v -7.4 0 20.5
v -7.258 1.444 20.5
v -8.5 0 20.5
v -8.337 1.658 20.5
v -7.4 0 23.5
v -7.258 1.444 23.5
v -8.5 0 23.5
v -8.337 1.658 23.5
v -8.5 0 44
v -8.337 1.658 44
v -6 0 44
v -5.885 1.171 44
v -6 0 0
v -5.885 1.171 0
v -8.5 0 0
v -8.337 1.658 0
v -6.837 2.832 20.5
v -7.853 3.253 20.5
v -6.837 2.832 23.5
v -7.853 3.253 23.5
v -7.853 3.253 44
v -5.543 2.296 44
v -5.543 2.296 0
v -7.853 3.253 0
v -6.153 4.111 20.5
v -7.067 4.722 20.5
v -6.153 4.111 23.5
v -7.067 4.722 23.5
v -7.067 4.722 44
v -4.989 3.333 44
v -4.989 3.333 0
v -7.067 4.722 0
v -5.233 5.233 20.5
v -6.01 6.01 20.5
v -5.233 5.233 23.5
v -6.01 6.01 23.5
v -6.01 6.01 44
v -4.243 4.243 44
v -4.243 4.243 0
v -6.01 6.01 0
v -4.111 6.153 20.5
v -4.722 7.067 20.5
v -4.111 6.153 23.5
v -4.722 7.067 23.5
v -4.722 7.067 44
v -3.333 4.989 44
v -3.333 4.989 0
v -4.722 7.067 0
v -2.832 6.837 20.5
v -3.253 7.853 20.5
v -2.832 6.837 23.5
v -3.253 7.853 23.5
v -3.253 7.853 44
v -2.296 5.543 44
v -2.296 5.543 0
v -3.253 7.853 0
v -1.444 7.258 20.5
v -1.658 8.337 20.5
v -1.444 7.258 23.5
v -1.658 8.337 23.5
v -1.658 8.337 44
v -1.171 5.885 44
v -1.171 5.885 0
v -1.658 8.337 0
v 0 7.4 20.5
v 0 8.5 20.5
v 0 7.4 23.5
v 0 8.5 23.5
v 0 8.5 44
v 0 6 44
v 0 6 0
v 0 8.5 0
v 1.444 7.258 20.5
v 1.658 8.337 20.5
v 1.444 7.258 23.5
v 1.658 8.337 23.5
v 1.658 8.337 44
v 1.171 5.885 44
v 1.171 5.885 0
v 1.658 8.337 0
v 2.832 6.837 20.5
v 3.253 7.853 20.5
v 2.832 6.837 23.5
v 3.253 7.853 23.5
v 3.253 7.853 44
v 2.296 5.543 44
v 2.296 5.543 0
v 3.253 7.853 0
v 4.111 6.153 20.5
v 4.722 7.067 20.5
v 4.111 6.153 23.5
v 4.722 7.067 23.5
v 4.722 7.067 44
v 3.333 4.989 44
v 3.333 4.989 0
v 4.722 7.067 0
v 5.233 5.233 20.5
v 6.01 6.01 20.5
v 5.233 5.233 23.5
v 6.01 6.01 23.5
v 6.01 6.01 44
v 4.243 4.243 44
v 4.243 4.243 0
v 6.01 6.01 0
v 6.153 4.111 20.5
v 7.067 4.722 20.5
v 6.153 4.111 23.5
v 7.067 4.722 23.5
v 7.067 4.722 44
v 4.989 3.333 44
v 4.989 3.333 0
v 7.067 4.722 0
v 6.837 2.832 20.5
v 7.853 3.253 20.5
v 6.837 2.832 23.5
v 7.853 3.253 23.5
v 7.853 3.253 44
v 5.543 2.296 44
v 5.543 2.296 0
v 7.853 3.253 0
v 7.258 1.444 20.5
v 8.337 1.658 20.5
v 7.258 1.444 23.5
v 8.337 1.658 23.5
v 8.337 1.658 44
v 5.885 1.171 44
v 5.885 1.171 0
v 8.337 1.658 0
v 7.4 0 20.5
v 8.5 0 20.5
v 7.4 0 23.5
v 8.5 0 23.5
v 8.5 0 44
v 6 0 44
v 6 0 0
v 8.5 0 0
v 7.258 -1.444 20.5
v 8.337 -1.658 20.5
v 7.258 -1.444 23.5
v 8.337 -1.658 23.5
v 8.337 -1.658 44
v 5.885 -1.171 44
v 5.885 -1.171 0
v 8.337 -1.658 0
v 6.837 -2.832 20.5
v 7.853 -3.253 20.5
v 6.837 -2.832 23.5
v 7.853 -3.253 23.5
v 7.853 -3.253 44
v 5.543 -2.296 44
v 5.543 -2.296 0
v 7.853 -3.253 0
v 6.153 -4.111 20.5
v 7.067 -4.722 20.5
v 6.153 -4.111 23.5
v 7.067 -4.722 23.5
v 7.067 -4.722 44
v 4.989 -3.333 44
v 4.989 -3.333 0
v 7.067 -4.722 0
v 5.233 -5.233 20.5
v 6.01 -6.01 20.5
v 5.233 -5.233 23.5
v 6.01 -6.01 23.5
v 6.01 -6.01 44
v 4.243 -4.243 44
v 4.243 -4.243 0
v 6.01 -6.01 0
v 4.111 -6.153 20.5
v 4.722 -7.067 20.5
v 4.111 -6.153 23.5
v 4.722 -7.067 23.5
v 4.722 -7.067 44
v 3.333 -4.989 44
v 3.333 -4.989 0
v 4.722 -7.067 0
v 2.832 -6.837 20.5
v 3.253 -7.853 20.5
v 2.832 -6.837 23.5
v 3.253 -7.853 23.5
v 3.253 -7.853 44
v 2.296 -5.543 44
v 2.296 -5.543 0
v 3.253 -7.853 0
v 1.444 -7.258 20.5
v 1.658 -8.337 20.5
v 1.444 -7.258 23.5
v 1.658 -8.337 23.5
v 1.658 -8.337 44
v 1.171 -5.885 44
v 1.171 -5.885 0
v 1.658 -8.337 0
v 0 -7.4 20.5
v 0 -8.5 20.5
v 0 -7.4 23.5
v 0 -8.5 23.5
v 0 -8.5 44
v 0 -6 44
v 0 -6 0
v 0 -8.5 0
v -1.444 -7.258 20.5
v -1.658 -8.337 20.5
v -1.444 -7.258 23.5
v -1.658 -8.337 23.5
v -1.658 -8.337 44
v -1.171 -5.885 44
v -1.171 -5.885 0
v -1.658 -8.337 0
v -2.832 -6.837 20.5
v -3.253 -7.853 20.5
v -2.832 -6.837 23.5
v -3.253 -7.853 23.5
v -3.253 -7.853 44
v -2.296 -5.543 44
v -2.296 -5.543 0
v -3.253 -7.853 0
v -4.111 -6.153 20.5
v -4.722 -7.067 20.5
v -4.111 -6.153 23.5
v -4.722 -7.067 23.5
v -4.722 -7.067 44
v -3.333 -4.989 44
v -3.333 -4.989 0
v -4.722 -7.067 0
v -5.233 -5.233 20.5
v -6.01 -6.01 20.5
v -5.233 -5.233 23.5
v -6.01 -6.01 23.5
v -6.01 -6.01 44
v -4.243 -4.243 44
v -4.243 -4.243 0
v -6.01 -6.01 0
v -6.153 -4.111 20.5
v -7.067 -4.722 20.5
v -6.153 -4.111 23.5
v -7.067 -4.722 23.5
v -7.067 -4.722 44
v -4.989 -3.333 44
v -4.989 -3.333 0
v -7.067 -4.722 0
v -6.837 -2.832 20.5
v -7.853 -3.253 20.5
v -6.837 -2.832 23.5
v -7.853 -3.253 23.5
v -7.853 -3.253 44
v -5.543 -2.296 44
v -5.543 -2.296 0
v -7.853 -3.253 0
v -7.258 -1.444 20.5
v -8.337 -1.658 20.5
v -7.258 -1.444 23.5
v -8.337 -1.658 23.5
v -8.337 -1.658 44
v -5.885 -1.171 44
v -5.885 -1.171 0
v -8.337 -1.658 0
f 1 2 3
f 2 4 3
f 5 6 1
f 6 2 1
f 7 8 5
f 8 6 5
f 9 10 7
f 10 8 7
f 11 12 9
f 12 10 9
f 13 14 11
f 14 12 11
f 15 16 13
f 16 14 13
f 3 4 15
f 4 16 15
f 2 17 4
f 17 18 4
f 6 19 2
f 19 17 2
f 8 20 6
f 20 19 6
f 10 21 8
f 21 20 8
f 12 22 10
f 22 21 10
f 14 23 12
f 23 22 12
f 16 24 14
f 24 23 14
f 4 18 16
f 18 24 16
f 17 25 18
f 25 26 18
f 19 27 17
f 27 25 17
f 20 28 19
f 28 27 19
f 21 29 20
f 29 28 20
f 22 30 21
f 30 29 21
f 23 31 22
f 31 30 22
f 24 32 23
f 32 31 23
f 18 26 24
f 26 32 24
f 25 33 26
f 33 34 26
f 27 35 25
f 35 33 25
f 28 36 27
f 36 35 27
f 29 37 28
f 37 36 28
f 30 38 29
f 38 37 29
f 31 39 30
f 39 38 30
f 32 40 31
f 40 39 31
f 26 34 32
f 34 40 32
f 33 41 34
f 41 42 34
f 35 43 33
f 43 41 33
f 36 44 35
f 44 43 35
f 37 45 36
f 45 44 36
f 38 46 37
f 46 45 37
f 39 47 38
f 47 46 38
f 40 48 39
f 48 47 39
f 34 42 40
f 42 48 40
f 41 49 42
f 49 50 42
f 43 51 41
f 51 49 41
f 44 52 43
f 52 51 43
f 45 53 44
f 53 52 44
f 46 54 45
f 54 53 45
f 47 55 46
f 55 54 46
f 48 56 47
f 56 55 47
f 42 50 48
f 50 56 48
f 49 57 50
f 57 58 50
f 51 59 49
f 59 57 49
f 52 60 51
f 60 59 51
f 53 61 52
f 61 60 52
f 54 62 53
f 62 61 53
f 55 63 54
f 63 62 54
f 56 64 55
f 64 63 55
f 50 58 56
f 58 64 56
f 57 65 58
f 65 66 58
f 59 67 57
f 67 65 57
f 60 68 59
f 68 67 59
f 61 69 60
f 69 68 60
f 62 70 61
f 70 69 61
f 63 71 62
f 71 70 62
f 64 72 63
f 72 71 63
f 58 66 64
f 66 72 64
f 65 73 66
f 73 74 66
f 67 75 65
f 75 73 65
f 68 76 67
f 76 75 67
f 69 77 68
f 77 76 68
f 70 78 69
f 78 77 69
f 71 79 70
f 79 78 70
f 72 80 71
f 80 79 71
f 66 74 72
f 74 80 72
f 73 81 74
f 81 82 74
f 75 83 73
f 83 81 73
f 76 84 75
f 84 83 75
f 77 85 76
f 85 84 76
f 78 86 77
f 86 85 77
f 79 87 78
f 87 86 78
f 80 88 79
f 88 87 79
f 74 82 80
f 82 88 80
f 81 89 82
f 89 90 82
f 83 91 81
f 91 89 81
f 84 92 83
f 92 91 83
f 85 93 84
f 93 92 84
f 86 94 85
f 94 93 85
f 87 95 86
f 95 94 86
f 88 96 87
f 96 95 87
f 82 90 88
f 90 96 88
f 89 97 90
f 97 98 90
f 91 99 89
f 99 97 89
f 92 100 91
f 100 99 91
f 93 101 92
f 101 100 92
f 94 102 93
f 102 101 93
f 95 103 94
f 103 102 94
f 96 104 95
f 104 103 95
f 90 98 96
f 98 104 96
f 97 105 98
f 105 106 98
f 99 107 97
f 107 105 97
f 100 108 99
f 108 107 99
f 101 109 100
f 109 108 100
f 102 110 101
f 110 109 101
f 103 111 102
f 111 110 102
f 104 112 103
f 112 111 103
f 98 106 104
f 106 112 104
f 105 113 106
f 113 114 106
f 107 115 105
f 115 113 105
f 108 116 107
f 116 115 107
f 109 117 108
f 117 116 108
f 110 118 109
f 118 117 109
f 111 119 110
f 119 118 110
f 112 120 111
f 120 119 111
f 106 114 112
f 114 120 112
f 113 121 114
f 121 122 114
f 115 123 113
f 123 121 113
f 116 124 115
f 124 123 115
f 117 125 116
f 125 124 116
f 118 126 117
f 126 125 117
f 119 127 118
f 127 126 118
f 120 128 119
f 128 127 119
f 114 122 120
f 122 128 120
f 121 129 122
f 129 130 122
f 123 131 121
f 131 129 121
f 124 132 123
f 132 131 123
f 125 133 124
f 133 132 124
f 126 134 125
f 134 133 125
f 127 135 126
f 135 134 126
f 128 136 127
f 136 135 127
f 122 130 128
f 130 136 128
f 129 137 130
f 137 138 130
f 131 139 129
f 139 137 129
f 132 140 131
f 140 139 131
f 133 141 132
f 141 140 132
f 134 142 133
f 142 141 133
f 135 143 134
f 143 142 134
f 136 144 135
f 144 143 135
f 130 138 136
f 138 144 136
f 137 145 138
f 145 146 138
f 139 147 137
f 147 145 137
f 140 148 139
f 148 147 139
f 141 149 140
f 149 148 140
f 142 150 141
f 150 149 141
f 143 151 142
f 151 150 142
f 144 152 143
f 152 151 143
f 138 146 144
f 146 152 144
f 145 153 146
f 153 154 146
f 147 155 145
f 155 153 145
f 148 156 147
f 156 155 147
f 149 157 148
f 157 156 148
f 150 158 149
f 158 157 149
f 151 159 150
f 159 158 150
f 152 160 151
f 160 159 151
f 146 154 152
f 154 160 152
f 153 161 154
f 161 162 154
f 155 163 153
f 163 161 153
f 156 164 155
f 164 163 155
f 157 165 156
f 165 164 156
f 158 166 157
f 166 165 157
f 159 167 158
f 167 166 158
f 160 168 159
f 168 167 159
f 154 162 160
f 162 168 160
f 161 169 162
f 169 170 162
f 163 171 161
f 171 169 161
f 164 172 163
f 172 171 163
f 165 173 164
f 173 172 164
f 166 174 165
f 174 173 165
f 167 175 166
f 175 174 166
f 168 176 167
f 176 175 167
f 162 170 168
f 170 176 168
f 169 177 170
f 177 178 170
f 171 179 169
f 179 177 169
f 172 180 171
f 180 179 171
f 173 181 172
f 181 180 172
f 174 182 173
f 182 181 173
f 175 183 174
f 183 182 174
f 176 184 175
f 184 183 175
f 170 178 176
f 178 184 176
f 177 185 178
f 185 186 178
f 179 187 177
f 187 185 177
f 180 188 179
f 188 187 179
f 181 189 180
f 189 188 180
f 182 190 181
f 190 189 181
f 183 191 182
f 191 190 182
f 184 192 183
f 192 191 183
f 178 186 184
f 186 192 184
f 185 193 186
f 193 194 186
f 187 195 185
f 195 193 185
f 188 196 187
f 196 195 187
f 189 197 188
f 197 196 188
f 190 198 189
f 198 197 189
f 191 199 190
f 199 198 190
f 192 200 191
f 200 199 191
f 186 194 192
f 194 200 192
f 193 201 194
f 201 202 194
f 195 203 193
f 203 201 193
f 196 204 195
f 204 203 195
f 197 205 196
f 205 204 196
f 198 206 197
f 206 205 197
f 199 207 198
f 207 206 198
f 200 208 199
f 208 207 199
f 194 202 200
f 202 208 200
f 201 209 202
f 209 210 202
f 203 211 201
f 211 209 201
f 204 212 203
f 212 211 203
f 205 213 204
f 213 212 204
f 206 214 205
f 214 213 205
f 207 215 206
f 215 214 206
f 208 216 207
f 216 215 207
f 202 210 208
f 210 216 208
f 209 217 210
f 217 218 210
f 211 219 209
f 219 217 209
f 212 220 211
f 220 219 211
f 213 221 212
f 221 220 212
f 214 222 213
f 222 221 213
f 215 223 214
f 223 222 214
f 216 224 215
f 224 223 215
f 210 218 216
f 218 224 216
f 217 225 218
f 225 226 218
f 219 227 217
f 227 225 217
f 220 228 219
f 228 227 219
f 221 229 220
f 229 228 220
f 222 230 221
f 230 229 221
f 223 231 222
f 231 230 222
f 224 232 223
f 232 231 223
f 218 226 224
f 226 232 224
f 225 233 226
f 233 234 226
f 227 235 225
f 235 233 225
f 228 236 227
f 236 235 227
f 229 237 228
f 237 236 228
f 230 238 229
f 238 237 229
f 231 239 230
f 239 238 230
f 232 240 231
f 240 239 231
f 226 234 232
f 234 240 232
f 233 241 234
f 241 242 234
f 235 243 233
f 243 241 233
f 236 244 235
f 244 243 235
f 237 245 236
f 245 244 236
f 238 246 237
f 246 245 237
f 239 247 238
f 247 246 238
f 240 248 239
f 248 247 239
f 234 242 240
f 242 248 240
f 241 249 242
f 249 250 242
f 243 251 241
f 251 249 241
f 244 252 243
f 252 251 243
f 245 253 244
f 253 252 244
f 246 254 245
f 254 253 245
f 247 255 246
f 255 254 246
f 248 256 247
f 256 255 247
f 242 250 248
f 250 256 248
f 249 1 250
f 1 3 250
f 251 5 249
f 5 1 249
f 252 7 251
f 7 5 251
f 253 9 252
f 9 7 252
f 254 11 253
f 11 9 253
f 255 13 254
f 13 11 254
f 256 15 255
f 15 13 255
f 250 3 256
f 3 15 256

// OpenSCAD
$fn = 32;

// ----------------------------------------------------------------------
// Grooved revolve: plain_grooves, bore R6
// ----------------------------------------------------------------------

// --- parameters (mm) ---
bore_r = 6;               // bore radius
outer_r = 8.5;            // outer radius of the body
total_h = 44;             // overall height, Z
wall = 2.5;               // radial wall thickness
groove_w = 3;             // groove width
groove_d = 1.1;           // groove depth
grooves = 1;              // number of outer grooves
fit_tol = 0.1;            // declared fit tolerance (prompt contract)
free_tol = 0.5;           // declared free tolerance (prompt contract)

bbox_x = 2 * outer_r;  // full diameter
bore_d = 2 * bore_r;  // bore diameter
body_d = 2 * outer_r;  // body diameter
revolve_angle = 360;  // full turn around the Z axis

profile = [[6, 0], [8.5, 0], [8.5, 20.5], [7.4, 20.5], [7.4, 23.5], [8.5, 23.5], [8.5, 44], [6, 44]];  // primary outline, 8 points, counter clockwise

// --- the one profile operation ---
rotate_extrude(angle = revolve_angle) polygon(points = profile);
